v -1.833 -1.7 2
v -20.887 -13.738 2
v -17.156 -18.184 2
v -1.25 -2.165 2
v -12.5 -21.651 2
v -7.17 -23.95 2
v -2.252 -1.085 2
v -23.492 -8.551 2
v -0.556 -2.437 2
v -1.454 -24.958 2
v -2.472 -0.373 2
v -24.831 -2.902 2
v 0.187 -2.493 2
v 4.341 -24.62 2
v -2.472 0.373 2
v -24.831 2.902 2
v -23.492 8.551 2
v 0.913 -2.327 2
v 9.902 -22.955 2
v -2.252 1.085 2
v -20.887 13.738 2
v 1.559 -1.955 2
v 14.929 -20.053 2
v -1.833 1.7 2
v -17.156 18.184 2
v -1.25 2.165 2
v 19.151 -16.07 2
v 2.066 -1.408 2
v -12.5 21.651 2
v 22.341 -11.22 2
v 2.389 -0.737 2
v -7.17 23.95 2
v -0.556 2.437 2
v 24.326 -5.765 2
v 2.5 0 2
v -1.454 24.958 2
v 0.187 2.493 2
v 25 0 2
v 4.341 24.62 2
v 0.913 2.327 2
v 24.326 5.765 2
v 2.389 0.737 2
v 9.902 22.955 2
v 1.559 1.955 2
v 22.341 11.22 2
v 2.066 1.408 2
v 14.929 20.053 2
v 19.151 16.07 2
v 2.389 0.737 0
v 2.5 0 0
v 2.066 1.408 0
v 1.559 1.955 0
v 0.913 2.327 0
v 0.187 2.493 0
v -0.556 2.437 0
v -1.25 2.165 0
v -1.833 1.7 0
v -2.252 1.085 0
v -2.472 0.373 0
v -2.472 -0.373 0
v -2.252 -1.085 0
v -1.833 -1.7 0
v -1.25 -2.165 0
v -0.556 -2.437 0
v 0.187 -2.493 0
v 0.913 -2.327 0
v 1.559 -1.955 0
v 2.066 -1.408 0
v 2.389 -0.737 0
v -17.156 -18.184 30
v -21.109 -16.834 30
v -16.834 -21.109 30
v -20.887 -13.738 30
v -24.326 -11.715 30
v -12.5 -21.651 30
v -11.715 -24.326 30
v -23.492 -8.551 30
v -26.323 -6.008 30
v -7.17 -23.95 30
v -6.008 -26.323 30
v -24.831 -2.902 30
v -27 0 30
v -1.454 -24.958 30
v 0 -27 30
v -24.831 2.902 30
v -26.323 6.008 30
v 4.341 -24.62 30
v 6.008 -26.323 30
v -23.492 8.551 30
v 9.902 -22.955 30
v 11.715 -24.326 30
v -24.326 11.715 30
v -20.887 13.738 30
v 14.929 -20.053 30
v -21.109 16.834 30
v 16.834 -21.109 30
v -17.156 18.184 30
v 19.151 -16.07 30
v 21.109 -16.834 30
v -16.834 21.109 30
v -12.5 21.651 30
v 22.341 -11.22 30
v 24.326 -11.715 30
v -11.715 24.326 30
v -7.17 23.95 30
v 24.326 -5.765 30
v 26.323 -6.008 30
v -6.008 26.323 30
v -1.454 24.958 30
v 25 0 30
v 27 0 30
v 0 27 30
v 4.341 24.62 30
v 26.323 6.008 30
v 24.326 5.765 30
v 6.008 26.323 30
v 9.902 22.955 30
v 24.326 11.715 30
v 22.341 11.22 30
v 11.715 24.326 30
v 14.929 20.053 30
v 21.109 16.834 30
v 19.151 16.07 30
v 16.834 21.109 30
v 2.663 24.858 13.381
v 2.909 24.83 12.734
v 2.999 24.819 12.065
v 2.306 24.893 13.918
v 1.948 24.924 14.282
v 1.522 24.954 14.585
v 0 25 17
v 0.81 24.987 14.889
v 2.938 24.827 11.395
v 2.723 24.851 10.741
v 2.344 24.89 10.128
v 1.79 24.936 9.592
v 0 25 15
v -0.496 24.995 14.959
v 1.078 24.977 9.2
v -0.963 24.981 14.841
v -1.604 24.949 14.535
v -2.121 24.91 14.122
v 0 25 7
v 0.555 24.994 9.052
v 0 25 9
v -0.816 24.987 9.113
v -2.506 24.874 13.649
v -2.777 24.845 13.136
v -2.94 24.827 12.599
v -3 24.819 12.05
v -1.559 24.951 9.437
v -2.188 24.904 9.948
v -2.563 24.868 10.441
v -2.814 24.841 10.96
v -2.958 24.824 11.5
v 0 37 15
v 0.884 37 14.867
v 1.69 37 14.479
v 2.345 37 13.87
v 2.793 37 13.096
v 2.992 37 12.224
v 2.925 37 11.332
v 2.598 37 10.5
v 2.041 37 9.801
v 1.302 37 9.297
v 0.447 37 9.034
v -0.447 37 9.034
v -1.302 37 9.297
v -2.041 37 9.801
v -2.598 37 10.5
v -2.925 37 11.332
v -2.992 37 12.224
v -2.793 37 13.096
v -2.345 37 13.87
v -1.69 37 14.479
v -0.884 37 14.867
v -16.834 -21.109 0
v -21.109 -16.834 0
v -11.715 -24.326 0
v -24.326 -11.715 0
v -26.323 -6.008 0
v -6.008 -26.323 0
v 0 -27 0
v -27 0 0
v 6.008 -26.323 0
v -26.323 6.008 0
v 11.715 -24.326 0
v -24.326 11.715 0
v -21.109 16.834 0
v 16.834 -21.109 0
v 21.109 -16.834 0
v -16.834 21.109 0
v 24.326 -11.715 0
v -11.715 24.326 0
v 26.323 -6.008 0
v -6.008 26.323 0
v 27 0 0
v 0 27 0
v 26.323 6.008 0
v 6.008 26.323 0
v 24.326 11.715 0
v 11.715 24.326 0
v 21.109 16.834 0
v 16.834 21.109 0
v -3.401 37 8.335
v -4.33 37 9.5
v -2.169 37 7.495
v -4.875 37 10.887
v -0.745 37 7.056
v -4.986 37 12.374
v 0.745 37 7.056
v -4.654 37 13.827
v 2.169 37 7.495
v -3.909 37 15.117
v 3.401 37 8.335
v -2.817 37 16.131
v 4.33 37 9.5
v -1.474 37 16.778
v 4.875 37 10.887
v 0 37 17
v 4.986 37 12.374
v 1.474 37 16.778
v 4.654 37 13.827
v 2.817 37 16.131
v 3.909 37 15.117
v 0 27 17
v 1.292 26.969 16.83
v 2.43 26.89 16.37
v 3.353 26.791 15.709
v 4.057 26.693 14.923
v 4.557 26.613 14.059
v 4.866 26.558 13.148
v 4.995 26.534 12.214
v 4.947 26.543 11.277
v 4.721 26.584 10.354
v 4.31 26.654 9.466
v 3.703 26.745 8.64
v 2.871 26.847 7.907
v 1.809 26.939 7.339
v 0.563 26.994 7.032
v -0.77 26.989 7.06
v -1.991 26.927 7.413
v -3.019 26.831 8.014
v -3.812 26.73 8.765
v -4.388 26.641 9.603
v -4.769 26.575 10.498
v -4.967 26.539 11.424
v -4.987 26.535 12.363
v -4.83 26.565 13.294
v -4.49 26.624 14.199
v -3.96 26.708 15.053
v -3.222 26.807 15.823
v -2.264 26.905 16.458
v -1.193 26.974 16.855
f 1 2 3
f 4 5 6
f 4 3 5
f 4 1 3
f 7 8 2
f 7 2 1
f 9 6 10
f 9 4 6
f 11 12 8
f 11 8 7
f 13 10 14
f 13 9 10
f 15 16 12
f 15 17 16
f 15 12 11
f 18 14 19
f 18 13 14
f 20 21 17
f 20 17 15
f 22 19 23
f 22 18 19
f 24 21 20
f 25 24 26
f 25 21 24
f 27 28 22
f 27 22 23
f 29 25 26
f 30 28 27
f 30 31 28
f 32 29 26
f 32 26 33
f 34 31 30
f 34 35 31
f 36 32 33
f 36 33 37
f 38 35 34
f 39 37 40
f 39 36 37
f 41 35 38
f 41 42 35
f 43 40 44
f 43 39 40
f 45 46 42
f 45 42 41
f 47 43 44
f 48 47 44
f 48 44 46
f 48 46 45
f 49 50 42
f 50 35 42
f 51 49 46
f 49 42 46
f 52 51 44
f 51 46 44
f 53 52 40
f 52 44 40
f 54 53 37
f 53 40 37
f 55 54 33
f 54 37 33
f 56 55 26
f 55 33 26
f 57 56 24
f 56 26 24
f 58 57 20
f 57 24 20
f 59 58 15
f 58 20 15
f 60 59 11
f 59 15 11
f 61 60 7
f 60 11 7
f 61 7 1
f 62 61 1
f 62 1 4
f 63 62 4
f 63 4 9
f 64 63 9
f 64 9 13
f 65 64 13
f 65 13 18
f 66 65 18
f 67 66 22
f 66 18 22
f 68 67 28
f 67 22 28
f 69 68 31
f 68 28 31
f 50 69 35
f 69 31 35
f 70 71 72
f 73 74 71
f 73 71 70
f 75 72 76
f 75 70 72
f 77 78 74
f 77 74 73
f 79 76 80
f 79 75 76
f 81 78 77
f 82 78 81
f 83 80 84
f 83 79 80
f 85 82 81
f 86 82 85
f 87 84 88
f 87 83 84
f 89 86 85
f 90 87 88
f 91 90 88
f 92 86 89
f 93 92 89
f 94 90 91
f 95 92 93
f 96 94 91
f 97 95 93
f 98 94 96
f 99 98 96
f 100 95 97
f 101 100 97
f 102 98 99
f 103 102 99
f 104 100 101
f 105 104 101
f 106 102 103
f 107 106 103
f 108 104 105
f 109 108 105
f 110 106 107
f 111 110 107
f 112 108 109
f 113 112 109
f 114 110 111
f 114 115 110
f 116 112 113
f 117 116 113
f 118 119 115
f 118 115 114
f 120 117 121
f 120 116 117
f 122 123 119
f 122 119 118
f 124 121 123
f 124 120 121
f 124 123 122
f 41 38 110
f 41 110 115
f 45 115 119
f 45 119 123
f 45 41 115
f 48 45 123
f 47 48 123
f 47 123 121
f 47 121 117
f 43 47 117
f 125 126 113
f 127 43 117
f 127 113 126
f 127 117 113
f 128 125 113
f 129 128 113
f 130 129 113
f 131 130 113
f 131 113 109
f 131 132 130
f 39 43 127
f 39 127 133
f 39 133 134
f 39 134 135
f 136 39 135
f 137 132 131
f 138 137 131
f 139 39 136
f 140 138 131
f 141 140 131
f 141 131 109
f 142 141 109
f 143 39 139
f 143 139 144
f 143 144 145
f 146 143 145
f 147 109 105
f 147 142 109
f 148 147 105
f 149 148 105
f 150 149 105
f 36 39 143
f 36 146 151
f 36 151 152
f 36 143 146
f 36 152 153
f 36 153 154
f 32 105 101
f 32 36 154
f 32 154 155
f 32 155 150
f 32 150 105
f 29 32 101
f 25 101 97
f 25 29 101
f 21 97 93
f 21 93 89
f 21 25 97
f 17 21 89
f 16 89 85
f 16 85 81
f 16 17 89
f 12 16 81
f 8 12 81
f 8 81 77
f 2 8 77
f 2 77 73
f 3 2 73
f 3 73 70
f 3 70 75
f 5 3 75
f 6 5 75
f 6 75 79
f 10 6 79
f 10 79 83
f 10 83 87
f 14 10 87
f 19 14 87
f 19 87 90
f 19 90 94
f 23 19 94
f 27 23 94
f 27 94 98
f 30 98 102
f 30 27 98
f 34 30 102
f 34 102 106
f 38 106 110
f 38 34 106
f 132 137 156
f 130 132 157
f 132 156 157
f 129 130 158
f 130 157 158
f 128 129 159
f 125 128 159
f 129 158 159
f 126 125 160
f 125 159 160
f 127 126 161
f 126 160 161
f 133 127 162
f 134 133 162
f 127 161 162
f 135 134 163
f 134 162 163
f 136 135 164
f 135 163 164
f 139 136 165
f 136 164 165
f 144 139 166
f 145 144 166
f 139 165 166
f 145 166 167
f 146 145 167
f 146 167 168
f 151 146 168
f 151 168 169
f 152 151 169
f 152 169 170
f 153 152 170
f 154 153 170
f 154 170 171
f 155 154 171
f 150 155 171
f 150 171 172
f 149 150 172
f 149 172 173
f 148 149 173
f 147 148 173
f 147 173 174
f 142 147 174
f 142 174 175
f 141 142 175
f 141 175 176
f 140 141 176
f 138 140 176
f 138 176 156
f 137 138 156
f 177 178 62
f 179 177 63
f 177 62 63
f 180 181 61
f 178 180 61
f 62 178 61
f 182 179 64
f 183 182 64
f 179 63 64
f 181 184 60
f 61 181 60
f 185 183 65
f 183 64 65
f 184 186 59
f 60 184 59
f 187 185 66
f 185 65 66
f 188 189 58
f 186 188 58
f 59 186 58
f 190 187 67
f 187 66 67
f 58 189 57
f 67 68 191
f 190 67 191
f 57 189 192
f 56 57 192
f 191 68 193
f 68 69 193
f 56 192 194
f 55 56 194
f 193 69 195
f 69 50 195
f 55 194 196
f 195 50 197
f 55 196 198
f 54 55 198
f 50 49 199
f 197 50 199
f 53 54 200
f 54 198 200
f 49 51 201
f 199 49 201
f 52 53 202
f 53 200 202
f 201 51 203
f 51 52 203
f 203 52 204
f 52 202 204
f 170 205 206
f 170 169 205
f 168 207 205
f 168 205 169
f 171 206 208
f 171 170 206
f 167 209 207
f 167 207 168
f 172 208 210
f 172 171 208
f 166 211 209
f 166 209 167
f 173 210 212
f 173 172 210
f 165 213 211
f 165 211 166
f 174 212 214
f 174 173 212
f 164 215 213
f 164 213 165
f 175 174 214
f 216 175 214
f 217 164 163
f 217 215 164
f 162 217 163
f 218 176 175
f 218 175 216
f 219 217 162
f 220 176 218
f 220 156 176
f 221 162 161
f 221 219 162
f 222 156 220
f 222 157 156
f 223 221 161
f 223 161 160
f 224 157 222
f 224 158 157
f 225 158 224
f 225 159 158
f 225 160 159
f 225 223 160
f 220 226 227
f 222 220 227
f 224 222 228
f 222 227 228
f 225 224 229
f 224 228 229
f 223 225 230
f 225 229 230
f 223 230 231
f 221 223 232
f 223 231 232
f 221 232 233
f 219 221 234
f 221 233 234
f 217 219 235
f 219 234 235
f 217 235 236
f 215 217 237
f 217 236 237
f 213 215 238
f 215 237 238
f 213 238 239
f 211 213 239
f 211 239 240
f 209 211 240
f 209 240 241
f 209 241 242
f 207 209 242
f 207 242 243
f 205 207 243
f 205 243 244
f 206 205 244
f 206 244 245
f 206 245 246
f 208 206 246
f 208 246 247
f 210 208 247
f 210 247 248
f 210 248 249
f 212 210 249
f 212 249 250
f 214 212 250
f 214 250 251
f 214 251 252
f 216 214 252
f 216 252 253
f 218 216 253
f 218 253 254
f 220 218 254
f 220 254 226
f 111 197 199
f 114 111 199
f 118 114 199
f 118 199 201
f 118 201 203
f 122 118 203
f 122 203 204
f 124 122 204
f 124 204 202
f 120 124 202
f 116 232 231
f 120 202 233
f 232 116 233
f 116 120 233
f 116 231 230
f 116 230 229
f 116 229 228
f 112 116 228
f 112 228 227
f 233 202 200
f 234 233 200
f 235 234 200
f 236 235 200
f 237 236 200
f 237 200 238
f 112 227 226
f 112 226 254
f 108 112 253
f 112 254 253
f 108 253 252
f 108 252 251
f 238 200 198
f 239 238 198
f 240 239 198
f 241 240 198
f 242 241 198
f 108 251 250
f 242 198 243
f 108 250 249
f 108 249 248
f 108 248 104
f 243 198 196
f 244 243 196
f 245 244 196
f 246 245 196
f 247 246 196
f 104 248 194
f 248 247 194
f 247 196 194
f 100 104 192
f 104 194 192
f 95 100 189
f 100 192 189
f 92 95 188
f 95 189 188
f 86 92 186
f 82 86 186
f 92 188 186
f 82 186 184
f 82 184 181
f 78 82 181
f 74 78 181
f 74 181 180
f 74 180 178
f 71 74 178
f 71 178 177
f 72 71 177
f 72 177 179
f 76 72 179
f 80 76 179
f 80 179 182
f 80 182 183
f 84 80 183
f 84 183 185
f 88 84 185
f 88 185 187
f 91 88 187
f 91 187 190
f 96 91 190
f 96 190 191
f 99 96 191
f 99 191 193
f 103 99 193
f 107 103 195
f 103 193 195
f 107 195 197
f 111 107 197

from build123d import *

# Parameters (mm, degrees)
SKETCH_1_R           = 27
EXTRUDE_1_DEPTH      = 2
SKETCH_2_R           = 27
SKETCH_2_R_2         = 25
EXTRUDE_2_DEPTH      = 30
SKETCH_3_R           = 2.5
CUT_EXTRUDE_1_DEPTH  = 15
EXTRUDE_3_DEPTH      = 10
EXTRUDE_3_DEPTH_BACK = 2
SKETCH_4_R           = 5
SKETCH_5_R           = 3
CUT_EXTRUDE_2_DEPTH  = 50


with BuildPart() as part:
    # 草图1 → 凸台-拉伸1 (new body)
    with BuildSketch(Plane.XY):
        Circle(SKETCH_1_R)
    extrude(amount=EXTRUDE_1_DEPTH)

    # 草图2 → 凸台-拉伸2 (add)
    with BuildSketch(Plane.XY):
        Circle(SKETCH_2_R)
        Circle(SKETCH_2_R_2, mode=Mode.SUBTRACT)
    extrude(amount=EXTRUDE_2_DEPTH)

    # 草图3 → 切除-拉伸1 (cut, symmetric)
    with BuildSketch(Plane.XY):
        Circle(SKETCH_3_R)
    extrude(amount=CUT_EXTRUDE_1_DEPTH, both=True, mode=Mode.SUBTRACT)

    # 草图4 → 凸台-拉伸3 (add, two sides: drawn at the far end of the back side and taken through both)
    with BuildSketch(Plane(origin=(0, 27, 0), x_dir=(1, 0, 0), z_dir=(0, 1, 0)).offset(-EXTRUDE_3_DEPTH_BACK)):
        with Locations(Location((0, -12, 0), (0, 0, 270))):
            Circle(SKETCH_4_R)
    extrude(amount=EXTRUDE_3_DEPTH + EXTRUDE_3_DEPTH_BACK)

    # 草图5 → 切除-拉伸2 (cut)
    with BuildSketch(Plane(origin=(0, 37, 0), x_dir=(1, 0, 0), z_dir=(0, 1, 0))):
        with Locations(Location((0, -12, 0), (0, 0, 270))):
            Circle(SKETCH_5_R)
    extrude(amount=-CUT_EXTRUDE_2_DEPTH, mode=Mode.SUBTRACT)


solid = part.part
